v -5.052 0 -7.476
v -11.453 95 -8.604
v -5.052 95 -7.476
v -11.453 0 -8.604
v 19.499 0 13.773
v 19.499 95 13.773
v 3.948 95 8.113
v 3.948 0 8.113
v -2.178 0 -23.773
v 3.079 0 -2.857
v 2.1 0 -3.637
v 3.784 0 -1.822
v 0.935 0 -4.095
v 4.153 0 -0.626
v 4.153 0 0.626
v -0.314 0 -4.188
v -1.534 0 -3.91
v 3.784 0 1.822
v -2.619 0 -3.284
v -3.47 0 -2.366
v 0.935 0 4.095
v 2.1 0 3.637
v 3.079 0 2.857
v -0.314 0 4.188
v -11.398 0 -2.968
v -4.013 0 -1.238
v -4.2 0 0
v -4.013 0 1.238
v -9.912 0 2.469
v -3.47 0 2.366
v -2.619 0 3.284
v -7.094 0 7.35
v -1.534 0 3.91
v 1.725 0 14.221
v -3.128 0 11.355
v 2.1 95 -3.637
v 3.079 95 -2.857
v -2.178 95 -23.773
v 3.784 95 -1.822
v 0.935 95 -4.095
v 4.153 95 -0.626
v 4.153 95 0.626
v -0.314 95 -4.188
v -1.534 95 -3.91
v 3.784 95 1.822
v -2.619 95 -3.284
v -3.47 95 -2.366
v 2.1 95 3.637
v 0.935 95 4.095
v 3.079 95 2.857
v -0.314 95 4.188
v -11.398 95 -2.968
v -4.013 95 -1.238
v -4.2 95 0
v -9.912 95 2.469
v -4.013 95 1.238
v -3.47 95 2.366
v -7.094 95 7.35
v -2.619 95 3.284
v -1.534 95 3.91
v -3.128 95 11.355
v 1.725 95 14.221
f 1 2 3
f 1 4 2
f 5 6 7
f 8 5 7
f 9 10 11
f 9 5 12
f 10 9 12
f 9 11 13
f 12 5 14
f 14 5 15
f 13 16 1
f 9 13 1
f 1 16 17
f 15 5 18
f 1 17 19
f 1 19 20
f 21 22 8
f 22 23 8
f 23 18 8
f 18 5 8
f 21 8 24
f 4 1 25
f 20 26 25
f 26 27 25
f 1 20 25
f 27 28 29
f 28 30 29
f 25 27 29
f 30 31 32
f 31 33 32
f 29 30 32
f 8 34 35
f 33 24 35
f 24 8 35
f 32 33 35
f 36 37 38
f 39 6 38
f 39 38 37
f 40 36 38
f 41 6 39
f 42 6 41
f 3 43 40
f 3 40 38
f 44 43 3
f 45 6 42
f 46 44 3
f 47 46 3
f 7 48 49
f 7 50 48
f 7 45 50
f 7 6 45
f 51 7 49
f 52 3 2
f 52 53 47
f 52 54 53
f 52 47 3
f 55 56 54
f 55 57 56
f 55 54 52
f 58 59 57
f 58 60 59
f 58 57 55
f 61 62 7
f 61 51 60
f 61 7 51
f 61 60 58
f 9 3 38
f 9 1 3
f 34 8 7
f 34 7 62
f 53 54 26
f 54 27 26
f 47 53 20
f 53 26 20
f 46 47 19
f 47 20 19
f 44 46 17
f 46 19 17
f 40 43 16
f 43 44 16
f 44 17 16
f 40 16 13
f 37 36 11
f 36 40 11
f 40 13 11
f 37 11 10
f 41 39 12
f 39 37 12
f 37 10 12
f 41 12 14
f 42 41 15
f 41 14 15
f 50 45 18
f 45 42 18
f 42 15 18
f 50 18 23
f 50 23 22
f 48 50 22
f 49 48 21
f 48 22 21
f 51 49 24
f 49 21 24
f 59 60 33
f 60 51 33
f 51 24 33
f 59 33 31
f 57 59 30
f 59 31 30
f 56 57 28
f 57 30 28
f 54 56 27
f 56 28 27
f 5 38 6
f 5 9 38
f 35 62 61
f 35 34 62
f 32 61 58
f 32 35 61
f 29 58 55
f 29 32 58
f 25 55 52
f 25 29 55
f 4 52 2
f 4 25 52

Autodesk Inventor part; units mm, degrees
ref_plane "YZ Plane" through (0, 0, 0) normal (1, 0, 0) x (0, 1, 0)
ref_plane "XZ Plane" through (0, 0, 0) normal (0, 1, 0) x (-1, 0, 0)
ref_plane "XY Plane" through (0, 0, 0) normal (0, 0, 1) x (1, 0, 0)
sketch "Sketch1" plane through (0, 0, 0) normal (0, 1, 0) x (-1, 0, 0)
  circle A0 centre (0, 0) radius 4.2
  line L0 (11.4529, -8.6044) -> (5.0517, -7.4757) construction
  line L1 (5.0517, -7.4757) -> (-4.499, -61.6402) construction
  line L2 (-4.499, -61.6402) -> (1.9023, -62.7689) construction
  line L3 (1.9023, -62.7689) -> (11.4529, -8.6044) construction
  line L4 (-3.9483, 8.1127) -> (-1.7252, 14.2207) construction
  line L5 (-1.7252, 14.2207) -> (-53.4083, 33.0318) construction
  line L6 (-53.4083, 33.0318) -> (-55.6314, 26.9238) construction
  line L7 (-55.6314, 26.9238) -> (-3.9483, 8.1127) construction
  arc A1 (11.4529, -8.6044) -> (-1.7252, 14.2207) centre (-10.3924, -6.0001) ccw
  line L8 (-3.9483, 8.1127) -> (-55.6314, 8.1127) construction
  line L9 (5.0517, -7.4757) -> (-3.9483, 8.1127) construction
  line L10 (0.5517, 0.3185) -> (-10.3924, -6.0001) construction
  line L11 (2.1781, -23.7726) -> (-19.4986, 13.7726)
  line L12 (11.4529, -8.6044) -> (5.0517, -7.4757)
  line L13 (5.0517, -7.4757) -> (2.1781, -23.7726)
  line L14 (-19.4986, 13.7726) -> (-3.9483, 8.1127)
  line L15 (-3.9483, 8.1127) -> (-1.7252, 14.2207)
  dimension "d0" = 8.4
  dimension "d2" = 6.5
  dimension "d3" = 55
  dimension "d4" = 100
  dimension "d5" = 22
  dimension "d6" = 18
  dimension "d7" = 20
  dimension "d8" = 0.637
  dimension "d9" = 10
extrude "Extrusion1" add sketch "Sketch1" along normal blind 95
properties part number "filament_guide_spool" material "ABS Plastic"
